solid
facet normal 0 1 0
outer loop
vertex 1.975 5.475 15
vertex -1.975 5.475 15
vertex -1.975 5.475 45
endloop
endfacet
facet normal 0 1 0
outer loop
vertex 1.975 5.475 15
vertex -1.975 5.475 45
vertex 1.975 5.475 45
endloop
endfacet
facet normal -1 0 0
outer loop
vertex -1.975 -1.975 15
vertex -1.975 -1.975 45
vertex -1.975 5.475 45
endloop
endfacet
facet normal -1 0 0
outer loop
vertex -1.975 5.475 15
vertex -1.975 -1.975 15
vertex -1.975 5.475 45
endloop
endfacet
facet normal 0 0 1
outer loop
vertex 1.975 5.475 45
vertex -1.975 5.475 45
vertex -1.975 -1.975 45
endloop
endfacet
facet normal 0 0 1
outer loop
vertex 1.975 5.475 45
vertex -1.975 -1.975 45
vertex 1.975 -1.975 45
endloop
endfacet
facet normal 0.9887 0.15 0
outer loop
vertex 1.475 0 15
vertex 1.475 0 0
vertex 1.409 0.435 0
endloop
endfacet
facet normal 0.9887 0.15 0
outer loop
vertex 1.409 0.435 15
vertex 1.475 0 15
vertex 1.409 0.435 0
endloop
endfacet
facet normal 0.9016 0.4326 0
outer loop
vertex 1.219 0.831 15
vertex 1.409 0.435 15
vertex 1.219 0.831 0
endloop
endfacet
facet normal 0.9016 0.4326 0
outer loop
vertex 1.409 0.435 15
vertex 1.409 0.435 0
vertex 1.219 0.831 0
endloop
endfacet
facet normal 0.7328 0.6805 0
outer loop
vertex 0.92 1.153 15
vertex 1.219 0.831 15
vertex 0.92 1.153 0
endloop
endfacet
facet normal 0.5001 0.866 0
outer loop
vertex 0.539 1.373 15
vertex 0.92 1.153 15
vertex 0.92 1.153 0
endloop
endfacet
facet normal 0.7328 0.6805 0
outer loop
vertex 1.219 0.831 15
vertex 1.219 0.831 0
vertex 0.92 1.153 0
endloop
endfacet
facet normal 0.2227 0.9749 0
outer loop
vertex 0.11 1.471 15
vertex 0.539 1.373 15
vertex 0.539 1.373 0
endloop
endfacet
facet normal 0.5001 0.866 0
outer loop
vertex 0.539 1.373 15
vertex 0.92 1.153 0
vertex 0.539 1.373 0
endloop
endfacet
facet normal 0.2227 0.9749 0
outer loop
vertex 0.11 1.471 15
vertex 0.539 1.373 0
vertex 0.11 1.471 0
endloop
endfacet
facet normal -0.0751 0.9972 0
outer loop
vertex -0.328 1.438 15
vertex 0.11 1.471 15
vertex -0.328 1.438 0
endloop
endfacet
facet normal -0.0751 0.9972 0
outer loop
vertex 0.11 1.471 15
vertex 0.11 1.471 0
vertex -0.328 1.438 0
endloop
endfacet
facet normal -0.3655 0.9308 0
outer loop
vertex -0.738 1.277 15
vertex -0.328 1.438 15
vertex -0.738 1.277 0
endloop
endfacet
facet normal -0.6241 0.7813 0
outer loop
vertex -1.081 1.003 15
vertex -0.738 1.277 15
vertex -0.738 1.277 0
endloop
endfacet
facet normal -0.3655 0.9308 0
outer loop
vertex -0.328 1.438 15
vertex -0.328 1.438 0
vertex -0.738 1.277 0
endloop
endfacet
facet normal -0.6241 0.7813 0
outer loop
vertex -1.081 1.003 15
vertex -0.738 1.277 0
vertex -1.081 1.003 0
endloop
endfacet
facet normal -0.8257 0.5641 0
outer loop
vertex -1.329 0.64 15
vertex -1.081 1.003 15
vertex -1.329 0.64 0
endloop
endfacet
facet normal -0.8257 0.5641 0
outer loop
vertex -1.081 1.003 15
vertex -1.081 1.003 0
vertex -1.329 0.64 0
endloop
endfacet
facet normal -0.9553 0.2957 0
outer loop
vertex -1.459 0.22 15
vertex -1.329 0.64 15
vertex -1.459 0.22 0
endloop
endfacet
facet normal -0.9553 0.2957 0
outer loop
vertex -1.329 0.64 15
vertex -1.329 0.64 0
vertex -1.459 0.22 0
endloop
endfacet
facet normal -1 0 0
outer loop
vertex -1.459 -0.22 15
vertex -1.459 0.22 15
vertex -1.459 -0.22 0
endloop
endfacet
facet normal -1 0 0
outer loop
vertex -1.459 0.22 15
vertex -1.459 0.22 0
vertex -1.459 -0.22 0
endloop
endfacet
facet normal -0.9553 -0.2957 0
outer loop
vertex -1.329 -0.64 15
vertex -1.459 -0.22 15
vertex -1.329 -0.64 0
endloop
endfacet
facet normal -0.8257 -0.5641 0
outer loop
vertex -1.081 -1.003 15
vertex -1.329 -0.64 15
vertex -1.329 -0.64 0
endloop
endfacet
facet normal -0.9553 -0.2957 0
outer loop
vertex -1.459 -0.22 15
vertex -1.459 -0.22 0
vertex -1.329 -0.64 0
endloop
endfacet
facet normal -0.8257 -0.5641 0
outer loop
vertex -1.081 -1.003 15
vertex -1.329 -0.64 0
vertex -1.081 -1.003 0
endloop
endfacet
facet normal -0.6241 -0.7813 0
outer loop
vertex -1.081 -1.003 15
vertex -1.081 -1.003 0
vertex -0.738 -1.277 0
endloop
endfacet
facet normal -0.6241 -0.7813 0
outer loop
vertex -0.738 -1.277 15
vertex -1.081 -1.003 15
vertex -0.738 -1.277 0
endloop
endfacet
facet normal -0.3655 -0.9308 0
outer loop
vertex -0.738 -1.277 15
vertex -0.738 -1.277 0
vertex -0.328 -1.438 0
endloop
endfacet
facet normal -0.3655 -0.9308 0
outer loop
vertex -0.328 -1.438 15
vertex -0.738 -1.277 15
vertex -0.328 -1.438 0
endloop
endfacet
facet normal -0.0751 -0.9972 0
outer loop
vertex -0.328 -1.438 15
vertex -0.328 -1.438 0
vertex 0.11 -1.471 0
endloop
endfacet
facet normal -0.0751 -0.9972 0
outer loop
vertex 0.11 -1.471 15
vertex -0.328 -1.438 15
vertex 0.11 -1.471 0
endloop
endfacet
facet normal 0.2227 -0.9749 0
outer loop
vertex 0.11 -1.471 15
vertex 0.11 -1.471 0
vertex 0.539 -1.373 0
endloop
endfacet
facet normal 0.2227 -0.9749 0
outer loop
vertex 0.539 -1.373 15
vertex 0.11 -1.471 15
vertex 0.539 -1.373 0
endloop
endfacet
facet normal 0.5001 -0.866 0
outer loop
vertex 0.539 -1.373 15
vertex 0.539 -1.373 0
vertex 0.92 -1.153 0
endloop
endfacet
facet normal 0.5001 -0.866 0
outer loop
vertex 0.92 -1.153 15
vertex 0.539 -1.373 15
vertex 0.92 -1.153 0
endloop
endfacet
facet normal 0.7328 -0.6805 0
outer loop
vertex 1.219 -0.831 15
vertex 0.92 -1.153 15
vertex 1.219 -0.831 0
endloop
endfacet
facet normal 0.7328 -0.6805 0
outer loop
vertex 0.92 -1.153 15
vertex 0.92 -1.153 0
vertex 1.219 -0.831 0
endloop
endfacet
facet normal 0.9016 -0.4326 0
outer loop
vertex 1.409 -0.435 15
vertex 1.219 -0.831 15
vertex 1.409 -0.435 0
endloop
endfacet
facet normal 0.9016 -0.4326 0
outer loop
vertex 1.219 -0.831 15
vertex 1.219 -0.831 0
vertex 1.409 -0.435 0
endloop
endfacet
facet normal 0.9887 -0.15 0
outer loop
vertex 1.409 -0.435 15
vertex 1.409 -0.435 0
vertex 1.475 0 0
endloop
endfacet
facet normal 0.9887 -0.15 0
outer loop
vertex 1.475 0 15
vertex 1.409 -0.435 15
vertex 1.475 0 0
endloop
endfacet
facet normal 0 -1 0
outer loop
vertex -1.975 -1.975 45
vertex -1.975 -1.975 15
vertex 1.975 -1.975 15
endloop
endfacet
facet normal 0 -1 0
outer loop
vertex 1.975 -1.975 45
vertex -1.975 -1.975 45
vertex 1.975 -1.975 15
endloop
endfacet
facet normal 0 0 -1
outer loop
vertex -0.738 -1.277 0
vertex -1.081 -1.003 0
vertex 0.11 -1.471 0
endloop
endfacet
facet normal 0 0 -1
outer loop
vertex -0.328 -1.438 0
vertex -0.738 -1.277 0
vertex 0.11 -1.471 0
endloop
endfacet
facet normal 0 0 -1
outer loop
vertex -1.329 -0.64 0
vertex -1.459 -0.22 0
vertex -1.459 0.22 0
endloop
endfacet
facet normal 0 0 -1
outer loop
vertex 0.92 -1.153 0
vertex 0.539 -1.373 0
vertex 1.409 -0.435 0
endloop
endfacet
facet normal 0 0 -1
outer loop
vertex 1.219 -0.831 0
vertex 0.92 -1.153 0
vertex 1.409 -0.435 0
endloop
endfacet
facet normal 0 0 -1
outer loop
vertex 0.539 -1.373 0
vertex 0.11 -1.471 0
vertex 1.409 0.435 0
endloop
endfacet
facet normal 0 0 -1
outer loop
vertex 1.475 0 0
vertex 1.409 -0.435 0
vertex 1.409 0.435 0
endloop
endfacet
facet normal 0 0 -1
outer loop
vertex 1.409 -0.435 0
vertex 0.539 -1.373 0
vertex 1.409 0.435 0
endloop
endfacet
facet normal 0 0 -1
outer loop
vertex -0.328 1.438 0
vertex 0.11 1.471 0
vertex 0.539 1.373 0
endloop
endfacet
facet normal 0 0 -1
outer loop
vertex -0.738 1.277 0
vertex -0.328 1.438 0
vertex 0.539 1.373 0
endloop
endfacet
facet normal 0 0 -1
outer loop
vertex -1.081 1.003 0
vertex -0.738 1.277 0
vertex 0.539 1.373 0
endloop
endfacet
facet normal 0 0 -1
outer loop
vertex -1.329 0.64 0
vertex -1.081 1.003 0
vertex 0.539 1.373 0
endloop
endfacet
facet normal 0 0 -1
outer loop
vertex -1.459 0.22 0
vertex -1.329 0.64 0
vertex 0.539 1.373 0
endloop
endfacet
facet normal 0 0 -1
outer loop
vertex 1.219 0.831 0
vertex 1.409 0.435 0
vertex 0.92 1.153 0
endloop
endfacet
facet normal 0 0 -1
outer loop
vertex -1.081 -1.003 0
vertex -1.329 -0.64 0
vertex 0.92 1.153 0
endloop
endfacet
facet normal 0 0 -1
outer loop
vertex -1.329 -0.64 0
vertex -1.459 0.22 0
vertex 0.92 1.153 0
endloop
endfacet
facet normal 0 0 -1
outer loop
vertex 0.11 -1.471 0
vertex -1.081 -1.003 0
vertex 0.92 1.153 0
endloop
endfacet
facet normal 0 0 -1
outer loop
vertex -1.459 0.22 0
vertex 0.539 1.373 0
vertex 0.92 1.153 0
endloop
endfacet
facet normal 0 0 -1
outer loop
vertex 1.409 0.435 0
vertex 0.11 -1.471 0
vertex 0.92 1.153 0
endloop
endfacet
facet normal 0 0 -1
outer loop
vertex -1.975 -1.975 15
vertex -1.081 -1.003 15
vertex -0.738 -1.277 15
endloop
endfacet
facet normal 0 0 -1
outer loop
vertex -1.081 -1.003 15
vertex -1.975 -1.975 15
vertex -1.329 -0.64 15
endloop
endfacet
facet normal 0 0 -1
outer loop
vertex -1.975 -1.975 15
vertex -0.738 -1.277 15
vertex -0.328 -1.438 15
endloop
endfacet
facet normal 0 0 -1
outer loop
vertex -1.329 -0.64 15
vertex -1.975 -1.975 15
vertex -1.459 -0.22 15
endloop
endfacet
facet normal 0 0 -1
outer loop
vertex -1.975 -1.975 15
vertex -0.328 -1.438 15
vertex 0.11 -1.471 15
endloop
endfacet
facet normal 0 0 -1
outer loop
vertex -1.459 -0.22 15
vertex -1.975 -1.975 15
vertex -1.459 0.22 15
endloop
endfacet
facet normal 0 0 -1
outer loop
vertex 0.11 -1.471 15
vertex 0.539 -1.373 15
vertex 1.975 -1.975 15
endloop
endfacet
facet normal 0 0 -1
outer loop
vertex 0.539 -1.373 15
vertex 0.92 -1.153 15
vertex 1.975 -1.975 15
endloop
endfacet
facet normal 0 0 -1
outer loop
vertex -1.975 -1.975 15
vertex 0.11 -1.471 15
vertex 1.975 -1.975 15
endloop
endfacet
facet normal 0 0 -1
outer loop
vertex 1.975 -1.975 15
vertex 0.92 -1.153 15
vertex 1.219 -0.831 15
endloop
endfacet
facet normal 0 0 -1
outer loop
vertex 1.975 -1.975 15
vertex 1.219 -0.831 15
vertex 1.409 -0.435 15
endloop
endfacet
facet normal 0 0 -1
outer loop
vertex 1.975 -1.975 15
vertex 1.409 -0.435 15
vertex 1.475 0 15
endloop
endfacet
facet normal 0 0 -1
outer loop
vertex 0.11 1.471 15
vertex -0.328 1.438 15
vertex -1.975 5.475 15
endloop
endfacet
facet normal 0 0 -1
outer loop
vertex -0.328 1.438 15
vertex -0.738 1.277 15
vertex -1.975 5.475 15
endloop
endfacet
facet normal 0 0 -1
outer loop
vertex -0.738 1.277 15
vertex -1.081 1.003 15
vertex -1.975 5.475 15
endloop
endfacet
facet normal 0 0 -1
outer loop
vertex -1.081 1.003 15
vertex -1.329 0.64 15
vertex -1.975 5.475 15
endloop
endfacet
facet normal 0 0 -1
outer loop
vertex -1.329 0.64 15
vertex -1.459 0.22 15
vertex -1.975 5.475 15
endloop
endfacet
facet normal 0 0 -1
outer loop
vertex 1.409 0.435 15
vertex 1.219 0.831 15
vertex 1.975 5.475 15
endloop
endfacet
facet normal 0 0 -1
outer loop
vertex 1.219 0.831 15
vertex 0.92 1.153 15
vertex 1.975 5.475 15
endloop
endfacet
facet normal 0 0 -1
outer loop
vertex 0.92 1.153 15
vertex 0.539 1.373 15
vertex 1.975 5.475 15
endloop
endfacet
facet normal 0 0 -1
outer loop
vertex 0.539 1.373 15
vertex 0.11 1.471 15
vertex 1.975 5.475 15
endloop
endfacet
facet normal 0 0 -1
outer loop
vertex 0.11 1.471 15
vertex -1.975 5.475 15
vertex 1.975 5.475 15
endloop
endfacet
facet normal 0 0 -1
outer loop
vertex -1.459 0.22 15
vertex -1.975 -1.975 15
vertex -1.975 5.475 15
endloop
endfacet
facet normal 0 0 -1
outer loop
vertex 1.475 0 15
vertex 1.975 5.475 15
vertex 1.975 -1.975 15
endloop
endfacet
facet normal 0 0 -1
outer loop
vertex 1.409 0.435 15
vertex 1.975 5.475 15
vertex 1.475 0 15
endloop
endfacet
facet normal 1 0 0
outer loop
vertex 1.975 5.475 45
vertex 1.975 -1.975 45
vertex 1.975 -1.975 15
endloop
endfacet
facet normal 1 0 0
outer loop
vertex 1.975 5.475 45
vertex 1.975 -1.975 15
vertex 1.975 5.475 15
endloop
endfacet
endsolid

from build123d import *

# Parameters (mm, degrees)
F0_R     = 1.475
F1_DEPTH = 15
F2_W     = 3.95
F2_H     = 7.45
F2_R     = 1.475
F3_DEPTH = 30


with BuildPart() as f1:
    # F0 (on Top) → F1 (new body)
    with BuildSketch(Plane.XY):
        Circle(F0_R)
    extrude(amount=F1_DEPTH)

    # F2 (on face) → F3 (join)
    with BuildSketch(Plane.XY.offset(15)):
        with Locations((0, 1.75)):
            Rectangle(F2_W, F2_H)
        Circle(F2_R, mode=Mode.SUBTRACT)
        Circle(F2_R)
    extrude(amount=F3_DEPTH)


solid = f1.part
